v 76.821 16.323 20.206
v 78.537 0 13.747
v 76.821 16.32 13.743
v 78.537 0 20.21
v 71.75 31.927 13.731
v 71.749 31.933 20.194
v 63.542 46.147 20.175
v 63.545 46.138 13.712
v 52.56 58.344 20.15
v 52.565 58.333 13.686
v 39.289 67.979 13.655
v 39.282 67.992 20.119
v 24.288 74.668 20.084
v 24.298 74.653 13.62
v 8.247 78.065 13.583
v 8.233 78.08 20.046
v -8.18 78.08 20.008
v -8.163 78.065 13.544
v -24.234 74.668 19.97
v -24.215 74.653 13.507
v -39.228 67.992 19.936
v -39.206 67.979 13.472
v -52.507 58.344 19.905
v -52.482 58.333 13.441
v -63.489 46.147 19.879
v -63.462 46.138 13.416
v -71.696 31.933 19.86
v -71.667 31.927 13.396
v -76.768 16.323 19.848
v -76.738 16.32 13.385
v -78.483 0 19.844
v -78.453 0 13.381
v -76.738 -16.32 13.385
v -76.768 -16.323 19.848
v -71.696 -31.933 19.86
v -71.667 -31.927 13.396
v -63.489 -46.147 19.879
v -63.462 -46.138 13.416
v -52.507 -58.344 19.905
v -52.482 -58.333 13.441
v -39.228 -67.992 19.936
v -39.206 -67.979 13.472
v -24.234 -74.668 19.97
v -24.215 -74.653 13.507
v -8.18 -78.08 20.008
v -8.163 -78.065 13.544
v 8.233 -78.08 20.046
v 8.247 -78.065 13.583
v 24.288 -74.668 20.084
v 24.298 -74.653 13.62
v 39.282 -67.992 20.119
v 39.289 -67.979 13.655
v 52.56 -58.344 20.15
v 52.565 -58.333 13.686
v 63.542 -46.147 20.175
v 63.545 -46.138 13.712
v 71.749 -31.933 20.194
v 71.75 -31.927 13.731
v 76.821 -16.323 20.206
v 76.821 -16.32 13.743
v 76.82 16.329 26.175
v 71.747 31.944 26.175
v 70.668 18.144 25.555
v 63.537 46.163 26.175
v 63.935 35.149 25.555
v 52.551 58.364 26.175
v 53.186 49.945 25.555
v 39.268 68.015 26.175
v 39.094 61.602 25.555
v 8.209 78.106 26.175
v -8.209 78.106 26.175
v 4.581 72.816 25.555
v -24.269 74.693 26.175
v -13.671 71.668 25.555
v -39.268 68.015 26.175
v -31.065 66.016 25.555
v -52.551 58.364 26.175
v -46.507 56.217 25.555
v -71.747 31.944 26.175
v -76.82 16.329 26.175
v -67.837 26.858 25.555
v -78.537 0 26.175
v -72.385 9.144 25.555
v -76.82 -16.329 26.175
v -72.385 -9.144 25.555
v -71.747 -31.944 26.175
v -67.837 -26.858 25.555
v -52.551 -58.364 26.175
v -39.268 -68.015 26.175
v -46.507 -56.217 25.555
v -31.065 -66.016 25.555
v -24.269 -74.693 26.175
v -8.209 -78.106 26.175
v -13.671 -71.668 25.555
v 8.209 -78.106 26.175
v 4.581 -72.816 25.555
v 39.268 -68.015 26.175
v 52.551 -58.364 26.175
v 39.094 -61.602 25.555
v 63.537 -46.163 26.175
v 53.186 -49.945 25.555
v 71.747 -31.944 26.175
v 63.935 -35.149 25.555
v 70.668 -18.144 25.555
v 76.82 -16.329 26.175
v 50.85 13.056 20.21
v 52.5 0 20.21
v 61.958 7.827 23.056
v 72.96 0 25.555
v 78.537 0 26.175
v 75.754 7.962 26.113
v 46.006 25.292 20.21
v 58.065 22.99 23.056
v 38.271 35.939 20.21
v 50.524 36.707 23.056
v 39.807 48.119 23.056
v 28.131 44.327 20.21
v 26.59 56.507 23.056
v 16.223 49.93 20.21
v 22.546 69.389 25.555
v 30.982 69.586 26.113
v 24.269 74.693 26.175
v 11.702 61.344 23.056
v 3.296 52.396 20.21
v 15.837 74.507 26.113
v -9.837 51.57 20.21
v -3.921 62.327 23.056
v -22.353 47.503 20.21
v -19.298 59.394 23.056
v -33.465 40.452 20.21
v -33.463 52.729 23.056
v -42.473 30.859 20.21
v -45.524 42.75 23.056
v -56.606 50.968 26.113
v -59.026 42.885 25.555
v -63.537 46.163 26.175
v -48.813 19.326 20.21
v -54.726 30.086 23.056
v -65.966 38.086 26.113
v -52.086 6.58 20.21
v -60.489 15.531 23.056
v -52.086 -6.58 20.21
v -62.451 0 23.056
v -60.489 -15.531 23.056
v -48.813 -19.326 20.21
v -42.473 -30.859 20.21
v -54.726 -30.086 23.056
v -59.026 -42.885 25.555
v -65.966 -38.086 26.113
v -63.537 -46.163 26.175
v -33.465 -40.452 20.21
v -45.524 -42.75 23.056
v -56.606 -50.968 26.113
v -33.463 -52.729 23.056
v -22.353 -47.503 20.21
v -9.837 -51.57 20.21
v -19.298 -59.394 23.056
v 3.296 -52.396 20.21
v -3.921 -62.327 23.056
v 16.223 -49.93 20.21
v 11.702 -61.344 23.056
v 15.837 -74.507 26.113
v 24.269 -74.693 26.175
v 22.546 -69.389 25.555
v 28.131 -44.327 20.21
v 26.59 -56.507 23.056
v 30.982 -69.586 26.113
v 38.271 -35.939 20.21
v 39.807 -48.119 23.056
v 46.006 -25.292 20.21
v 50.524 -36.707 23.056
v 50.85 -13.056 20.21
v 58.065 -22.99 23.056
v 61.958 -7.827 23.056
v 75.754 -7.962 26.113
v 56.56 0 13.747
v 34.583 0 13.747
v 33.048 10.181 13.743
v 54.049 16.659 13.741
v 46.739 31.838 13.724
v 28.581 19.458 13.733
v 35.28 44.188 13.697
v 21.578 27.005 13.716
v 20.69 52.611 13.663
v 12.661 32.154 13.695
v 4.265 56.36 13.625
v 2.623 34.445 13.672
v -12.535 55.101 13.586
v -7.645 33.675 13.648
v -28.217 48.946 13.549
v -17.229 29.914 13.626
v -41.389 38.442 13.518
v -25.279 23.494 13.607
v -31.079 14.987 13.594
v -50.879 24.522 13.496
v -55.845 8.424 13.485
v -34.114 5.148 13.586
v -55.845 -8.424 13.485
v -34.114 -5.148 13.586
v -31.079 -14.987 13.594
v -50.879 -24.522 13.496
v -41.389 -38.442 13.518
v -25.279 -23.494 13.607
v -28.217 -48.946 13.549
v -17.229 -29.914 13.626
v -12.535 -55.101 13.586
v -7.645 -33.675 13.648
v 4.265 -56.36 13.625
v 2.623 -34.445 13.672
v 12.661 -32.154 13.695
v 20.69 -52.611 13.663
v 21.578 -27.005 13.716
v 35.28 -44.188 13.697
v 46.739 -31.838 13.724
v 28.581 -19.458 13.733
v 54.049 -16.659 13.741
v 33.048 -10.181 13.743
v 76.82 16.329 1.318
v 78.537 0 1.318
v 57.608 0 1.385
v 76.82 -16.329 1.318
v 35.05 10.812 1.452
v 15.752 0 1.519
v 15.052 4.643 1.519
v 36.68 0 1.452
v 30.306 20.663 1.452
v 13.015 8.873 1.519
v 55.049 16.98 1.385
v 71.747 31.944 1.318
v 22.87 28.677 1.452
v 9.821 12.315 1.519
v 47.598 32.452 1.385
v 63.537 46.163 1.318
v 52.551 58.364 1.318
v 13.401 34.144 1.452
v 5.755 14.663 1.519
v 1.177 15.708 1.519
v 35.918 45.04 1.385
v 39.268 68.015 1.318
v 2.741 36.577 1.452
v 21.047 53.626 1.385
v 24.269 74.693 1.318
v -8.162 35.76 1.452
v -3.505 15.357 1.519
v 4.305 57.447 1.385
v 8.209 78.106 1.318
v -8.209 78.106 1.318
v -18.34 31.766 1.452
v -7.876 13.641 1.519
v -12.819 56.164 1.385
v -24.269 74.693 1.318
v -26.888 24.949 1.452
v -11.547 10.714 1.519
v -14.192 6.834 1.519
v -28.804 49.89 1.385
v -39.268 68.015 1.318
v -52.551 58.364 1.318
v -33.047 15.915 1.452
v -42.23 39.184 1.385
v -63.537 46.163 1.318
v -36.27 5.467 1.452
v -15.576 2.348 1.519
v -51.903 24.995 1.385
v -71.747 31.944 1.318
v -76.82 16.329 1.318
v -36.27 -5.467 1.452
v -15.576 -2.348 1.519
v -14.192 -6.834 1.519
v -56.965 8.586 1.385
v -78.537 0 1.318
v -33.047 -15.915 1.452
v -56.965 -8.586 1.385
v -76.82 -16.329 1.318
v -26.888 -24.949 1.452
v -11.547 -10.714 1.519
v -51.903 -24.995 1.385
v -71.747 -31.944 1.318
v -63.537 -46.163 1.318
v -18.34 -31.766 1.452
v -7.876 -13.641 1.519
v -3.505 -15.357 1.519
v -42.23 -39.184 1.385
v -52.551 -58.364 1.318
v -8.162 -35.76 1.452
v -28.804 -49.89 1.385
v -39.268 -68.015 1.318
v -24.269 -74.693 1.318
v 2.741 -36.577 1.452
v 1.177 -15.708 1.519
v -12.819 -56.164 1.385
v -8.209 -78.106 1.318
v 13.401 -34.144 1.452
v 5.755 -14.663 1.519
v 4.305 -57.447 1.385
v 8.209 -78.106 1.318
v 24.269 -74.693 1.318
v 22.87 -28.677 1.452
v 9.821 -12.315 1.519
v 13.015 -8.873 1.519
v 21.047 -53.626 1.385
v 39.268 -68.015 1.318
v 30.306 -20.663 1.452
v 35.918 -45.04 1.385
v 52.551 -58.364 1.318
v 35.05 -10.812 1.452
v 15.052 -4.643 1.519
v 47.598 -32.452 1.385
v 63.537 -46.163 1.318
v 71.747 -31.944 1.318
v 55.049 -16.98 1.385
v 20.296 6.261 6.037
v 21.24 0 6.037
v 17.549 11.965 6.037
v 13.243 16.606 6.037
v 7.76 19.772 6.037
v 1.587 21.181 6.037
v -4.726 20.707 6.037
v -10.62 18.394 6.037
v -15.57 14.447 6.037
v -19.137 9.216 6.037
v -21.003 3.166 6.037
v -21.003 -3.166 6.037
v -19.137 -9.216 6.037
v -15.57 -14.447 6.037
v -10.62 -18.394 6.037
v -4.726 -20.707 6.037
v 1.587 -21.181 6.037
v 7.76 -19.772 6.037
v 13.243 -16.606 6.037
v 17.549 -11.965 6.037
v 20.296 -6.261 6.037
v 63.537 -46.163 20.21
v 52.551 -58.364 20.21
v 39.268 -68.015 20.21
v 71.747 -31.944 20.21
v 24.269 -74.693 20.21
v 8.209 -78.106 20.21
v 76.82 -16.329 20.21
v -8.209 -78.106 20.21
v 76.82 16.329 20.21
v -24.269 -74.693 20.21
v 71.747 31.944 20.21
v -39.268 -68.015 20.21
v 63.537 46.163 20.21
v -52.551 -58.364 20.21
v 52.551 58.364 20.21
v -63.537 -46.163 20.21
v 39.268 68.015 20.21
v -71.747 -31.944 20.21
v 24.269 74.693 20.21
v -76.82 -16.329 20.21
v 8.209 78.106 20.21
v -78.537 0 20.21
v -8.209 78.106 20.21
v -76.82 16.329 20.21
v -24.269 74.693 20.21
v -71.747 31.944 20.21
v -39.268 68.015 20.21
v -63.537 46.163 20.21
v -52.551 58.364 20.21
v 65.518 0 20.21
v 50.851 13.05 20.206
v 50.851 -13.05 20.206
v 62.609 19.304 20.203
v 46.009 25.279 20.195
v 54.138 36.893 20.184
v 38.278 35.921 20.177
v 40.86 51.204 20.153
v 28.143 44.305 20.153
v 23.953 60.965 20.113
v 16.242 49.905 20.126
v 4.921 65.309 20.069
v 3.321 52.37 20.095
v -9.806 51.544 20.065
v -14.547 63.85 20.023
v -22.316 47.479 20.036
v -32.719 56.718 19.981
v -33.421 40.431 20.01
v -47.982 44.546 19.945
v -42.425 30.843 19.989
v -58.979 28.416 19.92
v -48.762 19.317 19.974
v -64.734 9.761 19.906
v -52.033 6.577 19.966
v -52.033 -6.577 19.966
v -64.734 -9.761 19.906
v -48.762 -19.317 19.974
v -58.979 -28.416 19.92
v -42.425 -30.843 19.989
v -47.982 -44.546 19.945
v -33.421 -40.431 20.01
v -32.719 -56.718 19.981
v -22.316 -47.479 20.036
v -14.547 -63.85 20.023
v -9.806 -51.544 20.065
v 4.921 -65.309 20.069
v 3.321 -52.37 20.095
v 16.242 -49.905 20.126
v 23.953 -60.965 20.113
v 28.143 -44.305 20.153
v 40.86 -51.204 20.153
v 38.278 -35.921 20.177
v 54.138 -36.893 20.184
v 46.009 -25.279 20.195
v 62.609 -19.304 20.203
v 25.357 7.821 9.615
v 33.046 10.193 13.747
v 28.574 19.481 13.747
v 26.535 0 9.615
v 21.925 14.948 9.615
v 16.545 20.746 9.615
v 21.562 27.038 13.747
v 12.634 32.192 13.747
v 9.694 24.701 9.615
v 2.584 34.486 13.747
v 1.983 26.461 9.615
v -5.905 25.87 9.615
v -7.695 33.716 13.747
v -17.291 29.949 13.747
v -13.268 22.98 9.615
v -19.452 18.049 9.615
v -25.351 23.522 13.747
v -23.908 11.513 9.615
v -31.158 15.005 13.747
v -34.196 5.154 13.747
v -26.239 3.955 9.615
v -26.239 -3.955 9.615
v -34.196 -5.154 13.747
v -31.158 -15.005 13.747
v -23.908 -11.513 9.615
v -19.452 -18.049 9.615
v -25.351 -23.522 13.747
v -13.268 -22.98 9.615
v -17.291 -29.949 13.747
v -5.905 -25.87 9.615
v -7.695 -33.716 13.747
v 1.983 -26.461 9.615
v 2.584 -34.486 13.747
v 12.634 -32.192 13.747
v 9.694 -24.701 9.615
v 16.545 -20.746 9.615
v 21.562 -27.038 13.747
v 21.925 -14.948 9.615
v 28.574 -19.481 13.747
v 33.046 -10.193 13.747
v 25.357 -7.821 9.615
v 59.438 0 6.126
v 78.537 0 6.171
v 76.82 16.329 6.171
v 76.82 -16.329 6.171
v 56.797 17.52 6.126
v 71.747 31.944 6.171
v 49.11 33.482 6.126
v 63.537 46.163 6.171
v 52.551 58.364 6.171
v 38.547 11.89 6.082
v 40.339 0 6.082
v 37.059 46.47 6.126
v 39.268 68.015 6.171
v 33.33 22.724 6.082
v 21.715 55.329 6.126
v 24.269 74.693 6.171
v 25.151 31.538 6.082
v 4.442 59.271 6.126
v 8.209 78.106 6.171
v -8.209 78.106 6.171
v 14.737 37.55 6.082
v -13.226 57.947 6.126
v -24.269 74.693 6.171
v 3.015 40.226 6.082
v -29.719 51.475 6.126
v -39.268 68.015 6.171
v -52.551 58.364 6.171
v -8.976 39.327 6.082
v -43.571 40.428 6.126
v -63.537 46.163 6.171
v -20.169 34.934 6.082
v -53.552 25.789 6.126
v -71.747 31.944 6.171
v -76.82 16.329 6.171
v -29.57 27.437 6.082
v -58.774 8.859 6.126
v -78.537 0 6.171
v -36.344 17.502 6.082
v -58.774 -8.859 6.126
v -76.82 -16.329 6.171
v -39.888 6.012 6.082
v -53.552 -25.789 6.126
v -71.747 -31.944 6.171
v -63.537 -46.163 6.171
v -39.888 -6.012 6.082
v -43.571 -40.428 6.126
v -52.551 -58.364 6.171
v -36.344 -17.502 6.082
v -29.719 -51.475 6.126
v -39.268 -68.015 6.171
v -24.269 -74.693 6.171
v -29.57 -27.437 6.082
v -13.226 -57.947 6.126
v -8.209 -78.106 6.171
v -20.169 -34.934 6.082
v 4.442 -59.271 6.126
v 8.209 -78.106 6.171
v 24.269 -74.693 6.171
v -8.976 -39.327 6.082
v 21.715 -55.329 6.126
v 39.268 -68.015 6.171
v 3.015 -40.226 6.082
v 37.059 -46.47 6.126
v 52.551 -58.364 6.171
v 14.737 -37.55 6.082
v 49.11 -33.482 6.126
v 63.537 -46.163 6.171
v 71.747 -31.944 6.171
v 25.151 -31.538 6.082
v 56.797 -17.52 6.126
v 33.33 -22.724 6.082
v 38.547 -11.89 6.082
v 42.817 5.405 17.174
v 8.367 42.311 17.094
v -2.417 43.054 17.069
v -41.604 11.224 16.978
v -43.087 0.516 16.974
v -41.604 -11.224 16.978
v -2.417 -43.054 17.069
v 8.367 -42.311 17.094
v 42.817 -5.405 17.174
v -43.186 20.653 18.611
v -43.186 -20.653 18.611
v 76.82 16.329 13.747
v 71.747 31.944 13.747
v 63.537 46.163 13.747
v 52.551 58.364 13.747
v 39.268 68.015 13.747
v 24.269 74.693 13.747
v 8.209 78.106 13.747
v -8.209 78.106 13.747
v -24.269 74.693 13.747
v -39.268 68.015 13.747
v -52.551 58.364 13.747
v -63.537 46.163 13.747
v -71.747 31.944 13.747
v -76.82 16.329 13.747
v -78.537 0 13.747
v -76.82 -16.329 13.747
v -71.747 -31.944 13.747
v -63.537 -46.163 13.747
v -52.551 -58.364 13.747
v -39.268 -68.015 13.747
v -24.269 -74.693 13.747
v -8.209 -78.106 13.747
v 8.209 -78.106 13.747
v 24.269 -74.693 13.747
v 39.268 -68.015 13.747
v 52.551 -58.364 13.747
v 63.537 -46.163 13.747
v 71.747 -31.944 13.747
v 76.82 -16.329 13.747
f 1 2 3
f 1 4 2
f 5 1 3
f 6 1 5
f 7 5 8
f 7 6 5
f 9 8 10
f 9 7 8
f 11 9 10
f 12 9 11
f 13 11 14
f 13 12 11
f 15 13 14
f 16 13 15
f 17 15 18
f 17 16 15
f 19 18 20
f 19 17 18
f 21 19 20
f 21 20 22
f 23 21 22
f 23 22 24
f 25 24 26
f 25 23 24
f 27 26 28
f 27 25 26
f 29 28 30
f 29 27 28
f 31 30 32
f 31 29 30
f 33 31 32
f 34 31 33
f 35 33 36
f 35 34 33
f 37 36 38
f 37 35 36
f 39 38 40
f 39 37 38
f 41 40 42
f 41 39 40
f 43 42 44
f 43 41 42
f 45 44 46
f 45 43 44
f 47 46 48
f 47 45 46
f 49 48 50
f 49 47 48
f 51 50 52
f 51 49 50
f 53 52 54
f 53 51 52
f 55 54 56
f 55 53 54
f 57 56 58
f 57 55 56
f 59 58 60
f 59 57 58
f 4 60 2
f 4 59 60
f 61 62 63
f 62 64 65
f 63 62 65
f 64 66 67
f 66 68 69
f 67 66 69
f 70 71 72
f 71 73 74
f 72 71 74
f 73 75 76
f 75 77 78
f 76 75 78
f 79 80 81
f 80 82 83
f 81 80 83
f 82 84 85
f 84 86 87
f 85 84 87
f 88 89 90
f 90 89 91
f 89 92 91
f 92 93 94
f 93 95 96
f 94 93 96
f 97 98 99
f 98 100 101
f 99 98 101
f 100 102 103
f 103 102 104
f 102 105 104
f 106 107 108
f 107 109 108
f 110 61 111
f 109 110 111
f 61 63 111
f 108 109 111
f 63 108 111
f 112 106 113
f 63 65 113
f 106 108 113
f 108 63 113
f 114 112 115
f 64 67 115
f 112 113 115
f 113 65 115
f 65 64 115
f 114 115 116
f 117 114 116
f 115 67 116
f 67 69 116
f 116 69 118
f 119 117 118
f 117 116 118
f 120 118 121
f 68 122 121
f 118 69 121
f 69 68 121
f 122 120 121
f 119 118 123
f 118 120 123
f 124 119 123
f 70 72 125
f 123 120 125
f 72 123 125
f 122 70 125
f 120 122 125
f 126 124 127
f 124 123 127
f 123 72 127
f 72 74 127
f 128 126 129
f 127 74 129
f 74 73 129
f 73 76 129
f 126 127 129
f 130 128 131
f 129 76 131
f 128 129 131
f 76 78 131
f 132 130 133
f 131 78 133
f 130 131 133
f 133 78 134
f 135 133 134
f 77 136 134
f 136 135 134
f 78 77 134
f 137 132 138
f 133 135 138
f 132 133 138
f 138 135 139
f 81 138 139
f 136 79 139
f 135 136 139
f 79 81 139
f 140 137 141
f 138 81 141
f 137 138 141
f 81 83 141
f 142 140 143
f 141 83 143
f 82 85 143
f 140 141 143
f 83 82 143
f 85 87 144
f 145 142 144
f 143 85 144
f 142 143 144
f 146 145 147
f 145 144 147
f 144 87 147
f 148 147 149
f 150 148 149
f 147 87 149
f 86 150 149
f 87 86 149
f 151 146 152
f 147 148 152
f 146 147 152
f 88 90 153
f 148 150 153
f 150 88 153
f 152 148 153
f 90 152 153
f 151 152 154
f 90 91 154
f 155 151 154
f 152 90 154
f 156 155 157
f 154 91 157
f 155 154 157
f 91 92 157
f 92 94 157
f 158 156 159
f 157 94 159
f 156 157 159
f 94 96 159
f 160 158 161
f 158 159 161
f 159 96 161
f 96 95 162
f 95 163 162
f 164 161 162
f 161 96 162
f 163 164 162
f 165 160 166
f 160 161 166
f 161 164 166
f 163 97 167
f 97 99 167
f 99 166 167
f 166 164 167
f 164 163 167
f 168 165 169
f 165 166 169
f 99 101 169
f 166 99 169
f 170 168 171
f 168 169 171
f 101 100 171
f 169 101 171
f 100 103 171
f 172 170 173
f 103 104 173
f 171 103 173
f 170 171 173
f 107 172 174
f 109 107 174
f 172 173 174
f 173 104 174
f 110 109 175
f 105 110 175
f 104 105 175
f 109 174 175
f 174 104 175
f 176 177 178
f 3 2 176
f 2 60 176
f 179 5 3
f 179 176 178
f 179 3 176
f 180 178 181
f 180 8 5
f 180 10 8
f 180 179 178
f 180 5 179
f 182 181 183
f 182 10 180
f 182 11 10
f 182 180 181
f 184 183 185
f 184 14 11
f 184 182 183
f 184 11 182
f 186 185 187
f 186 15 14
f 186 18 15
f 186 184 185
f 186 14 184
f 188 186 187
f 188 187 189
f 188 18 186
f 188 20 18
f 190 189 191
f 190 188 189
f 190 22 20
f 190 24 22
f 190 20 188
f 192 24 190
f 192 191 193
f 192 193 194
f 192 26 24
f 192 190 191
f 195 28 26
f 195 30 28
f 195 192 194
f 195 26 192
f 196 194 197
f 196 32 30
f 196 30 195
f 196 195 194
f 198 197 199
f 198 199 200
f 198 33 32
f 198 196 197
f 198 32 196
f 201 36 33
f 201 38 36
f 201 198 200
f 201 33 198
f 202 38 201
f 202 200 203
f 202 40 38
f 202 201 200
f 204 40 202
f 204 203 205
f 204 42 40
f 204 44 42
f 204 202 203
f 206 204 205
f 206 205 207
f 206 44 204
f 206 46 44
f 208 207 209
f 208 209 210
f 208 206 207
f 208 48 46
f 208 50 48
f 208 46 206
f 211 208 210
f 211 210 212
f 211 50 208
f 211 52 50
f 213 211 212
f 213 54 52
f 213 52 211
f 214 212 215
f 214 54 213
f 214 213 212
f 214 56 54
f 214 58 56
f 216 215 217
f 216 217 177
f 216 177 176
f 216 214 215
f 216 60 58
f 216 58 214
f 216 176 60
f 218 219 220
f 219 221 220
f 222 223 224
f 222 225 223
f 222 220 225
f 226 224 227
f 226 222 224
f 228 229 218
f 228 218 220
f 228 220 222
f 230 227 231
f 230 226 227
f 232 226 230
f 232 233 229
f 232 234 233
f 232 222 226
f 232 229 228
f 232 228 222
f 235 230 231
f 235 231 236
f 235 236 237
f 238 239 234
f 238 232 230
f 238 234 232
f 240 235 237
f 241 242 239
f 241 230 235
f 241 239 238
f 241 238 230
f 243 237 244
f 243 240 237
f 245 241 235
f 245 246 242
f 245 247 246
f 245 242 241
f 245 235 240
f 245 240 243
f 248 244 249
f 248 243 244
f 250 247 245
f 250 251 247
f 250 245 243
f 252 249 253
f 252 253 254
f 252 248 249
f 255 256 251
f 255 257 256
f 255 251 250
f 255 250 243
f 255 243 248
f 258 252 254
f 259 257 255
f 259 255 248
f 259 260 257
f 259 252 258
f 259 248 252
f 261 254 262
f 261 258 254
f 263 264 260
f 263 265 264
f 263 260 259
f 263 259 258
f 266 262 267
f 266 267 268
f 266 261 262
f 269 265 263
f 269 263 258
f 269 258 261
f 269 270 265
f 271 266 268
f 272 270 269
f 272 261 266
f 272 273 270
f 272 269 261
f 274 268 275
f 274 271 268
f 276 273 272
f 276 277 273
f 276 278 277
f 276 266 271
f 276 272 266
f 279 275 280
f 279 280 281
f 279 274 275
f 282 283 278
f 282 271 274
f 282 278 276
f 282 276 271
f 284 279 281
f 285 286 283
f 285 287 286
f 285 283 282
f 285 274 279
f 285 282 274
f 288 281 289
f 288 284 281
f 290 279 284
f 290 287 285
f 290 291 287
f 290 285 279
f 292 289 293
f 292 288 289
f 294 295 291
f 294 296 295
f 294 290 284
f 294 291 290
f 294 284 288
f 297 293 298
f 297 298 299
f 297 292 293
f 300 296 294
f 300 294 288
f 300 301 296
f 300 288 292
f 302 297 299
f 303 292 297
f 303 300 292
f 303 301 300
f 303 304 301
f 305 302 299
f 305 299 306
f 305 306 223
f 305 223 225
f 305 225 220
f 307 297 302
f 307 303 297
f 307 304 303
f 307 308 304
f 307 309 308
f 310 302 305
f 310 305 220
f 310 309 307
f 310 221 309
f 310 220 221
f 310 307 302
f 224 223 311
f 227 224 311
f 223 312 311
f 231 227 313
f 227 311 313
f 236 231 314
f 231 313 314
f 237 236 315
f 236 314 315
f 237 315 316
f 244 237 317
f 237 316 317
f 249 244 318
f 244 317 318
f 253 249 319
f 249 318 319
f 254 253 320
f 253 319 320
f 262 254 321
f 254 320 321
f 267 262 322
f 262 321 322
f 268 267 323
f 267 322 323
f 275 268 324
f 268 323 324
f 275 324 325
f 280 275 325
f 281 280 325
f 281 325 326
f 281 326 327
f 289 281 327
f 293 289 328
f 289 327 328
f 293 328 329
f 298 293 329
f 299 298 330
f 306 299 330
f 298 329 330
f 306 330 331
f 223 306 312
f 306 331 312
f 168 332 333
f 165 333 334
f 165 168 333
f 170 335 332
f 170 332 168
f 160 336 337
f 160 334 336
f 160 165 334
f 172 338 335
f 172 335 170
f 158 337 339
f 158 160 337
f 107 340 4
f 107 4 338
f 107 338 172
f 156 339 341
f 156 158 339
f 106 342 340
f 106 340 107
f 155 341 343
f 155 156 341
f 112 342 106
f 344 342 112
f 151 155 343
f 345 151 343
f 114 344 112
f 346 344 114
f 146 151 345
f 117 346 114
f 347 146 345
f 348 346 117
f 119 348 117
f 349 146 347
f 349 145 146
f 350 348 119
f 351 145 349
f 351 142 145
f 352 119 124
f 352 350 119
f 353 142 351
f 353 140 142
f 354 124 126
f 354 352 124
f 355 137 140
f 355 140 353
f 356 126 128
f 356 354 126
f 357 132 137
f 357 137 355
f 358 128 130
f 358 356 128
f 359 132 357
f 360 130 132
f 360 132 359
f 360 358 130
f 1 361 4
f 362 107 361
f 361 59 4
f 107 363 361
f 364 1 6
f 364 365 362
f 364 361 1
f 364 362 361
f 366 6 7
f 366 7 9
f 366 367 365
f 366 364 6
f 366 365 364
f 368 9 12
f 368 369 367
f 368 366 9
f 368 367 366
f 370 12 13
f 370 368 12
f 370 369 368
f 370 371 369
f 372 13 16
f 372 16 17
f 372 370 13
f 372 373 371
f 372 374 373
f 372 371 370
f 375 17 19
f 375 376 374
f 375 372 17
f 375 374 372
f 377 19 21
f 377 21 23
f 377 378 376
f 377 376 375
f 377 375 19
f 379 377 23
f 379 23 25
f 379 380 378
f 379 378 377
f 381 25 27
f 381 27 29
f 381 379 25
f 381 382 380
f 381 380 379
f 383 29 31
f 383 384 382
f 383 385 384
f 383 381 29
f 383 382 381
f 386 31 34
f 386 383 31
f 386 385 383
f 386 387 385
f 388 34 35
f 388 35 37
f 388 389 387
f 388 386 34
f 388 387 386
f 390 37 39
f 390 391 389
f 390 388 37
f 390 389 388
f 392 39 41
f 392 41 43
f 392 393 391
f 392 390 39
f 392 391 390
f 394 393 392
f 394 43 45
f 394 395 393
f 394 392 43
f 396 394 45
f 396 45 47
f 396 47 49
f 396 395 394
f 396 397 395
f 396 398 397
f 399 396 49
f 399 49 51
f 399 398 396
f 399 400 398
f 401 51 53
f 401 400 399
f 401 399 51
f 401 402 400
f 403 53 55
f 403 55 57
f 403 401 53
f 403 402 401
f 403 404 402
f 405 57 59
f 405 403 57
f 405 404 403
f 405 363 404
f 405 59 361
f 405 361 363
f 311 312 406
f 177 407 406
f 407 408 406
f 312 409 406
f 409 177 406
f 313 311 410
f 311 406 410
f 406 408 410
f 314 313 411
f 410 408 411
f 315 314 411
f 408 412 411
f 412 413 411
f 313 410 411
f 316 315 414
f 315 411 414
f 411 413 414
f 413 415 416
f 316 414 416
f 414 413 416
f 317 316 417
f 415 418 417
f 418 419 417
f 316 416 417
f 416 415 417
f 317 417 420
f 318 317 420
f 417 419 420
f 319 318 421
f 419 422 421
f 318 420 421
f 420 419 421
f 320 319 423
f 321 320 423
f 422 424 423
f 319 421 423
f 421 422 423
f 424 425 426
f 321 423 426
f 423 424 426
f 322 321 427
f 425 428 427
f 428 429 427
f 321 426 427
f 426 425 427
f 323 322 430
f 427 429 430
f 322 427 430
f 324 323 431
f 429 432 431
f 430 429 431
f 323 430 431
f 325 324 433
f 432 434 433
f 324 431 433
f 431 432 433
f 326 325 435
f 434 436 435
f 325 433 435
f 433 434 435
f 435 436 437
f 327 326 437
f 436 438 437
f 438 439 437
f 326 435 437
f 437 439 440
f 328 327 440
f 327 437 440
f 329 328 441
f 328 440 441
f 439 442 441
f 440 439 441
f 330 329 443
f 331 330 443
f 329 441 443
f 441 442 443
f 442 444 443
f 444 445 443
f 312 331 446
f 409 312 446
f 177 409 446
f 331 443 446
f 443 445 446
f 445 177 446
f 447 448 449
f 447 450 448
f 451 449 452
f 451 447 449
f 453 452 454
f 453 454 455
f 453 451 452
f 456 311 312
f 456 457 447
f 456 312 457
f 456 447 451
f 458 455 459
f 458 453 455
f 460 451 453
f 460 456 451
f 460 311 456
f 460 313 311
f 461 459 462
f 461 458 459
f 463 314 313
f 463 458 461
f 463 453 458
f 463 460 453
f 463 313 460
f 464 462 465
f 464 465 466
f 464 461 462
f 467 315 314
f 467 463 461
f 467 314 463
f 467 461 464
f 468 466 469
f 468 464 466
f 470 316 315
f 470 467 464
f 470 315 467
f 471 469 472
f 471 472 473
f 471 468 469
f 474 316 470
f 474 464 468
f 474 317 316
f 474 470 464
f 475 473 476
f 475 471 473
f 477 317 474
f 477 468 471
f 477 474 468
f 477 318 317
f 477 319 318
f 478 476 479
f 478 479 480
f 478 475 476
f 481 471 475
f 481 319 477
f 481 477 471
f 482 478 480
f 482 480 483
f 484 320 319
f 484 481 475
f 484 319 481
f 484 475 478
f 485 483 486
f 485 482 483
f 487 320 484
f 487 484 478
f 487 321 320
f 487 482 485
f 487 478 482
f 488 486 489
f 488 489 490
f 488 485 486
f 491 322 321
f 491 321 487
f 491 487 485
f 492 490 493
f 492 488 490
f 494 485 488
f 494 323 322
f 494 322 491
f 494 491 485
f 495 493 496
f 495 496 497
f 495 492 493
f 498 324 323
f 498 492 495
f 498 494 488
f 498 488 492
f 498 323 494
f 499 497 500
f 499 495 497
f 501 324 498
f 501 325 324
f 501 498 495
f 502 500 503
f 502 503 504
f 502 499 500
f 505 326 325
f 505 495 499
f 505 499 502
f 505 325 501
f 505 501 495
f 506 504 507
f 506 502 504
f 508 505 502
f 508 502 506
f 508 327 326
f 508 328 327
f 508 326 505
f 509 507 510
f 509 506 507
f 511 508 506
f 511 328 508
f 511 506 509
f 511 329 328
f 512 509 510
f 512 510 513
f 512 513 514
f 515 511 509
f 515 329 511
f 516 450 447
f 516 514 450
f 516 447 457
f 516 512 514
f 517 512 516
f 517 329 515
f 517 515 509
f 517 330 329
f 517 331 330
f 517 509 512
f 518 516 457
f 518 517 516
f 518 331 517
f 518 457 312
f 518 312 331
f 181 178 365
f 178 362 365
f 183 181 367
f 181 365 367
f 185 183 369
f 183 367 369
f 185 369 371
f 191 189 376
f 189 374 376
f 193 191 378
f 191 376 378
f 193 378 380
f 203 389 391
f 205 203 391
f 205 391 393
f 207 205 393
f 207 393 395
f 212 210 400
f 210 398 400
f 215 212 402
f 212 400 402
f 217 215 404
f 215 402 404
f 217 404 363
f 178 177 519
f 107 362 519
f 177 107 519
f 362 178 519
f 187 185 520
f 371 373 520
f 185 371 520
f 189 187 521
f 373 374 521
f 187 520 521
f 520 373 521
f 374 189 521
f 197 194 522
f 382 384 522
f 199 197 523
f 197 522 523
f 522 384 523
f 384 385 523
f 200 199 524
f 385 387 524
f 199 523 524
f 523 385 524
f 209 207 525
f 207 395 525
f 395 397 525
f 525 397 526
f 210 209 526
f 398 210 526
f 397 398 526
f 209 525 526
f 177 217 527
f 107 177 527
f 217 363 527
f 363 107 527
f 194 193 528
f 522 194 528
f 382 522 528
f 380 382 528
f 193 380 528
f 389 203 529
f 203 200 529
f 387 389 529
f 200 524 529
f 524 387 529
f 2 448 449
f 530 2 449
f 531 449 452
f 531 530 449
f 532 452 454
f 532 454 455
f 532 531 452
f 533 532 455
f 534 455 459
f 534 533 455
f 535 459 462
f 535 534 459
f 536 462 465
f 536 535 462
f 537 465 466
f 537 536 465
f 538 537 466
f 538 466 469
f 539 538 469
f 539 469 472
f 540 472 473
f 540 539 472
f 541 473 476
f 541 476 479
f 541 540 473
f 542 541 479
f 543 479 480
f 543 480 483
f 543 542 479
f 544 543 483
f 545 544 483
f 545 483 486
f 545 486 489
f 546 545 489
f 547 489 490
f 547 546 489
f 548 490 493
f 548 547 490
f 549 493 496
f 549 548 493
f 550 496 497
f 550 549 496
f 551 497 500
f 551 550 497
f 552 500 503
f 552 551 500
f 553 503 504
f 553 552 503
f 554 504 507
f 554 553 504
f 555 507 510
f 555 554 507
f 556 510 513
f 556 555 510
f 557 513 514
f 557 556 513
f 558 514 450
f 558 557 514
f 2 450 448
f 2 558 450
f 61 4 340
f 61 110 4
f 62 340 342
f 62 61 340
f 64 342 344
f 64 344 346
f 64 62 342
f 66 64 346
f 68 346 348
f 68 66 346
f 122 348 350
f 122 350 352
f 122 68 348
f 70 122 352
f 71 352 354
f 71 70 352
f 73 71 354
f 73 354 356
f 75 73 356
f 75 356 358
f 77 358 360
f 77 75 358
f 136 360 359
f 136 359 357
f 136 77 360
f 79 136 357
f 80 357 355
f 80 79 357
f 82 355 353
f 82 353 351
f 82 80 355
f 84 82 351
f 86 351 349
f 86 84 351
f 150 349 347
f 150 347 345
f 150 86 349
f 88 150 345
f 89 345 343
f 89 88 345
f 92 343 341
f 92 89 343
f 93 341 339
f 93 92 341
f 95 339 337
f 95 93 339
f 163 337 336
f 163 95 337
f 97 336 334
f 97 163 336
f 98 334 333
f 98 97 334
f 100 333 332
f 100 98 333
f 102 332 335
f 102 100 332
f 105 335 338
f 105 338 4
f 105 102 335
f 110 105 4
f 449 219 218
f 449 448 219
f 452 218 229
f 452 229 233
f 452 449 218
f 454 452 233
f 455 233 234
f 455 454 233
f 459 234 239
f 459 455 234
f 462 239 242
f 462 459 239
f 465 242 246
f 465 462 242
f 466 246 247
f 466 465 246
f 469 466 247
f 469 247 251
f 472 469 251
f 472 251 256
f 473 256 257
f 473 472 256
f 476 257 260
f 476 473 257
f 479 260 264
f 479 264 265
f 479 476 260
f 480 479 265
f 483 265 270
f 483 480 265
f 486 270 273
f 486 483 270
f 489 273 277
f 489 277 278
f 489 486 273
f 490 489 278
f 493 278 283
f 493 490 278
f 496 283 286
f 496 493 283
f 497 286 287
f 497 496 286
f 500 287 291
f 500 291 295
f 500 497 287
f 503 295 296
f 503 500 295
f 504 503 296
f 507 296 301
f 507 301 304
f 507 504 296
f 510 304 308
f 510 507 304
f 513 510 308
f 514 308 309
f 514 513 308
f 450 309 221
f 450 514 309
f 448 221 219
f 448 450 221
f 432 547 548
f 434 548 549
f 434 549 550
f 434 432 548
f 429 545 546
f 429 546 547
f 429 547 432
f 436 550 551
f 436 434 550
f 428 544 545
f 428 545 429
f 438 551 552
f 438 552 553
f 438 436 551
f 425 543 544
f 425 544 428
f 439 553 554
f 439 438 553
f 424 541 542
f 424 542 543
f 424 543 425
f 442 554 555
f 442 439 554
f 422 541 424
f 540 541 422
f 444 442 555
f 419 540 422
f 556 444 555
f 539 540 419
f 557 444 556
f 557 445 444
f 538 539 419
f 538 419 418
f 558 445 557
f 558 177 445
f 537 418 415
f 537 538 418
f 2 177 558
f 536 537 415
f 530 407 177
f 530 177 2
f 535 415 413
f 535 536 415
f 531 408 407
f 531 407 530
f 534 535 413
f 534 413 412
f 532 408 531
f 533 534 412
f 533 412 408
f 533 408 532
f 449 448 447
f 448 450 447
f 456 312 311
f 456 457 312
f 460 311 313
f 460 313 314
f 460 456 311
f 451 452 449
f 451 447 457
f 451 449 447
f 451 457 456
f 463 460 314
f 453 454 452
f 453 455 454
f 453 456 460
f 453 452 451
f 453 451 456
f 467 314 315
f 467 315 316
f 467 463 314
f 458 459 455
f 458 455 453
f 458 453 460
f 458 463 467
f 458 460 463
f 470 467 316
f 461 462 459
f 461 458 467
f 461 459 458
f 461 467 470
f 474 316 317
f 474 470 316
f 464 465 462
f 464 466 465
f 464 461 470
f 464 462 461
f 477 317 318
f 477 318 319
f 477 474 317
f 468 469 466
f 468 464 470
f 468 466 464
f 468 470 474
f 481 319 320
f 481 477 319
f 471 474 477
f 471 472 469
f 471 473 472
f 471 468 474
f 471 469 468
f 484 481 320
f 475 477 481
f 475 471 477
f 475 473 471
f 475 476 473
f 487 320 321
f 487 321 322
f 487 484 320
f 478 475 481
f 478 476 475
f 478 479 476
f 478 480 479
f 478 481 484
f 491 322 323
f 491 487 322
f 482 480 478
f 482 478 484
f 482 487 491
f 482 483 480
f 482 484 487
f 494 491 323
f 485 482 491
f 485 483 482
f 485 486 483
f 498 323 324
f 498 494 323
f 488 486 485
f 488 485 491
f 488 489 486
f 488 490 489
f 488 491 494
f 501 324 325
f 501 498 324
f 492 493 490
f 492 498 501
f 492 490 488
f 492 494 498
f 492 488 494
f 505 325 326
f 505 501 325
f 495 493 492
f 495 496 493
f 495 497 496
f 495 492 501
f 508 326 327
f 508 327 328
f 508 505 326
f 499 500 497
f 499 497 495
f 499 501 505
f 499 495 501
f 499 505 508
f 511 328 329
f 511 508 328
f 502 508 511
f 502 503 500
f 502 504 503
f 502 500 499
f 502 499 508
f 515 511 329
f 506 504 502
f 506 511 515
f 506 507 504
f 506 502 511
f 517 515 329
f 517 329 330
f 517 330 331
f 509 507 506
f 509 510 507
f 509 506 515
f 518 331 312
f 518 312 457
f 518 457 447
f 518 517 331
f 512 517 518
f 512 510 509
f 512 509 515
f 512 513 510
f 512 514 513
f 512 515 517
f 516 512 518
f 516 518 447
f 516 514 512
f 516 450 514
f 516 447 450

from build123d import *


with BuildPart() as f1:
    # F0 (on Front) → F1 (revolve)
    with BuildSketch(Plane.XZ):
        with BuildLine():
            add(Edge.make_bspline(
                [(15.7515468455, 1.5186385906), (16.2569814963, 1.959361021), (17.2846288696, 2.8554358099), (18.9526439694, 4.166854506), (20.3713483355, 5.3705503671), (21.0733665388, 5.9114203979), (21.2399935025, 6.0371666258)],
                knots=[0, 0, 0, 0, 0.0363510009, 0.0739086854, 0.112559803, 0.1251067413, 0.1251067413, 0.1251067413, 0.1251067413], degree=3))
            Line((15.7515468455, 1.5186385906), (78.5365324529, 1.318038129))
            Line((78.5365324529, 1.318038129), (78.5365324529, 6.1707655311))
            Line((78.5365324529, 6.1707655311), (21.2399935025, 6.0371666258))
        make_face()
    revolve(axis=Axis((0, 0, 16.4799756994), (0, 0, 1)))


with BuildPart() as f2:
    # F0 (on Front) → F2 (revolve)
    with BuildSketch(Plane.XZ):
        with BuildLine():
            add(Edge.make_bspline(
                [(21.2399935025, 6.0371666258), (21.5009112116, 6.234070038), (22.1342698046, 6.6949997973), (23.1310298936, 7.396516823), (24.8194929191, 8.4575455522), (25.7576037559, 9.2164833794), (29.1454642161, 11.0654940256), (31.8957072977, 12.37057363), (33.6465721386, 13.3169859548), (34.5826536048, 13.7466102251)],
                knots=[0.1251067413, 0.1251067413, 0.1251067413, 0.1251067413, 0.1447537319, 0.1753550601, 0.2105716651, 0.239375986, 0.2887628656, 0.3347946409, 0.3782386594, 0.3782386594, 0.3782386594, 0.3782386594], degree=3))
            Line((21.2399935025, 6.0371666258), (78.5365324529, 6.1707655311))
            Line((78.5365324529, 6.1707655311), (78.5365324529, 13.7466102251))
            Line((78.5365324529, 13.7466102251), (34.5826536048, 13.7466102251))
        make_face()
    revolve(axis=Axis((0, 0, 16.4799756994), (0, 0, 1)))


with BuildPart() as f3:
    # F0 (on Front) → F3 (revolve)
    with BuildSketch(Plane.XZ):
        with BuildLine():
            add(Edge.make_bspline(
                [(34.5826536048, 13.7466102251), (34.606915689, 13.7577455596), (35.6814873865, 14.2488728005), (38.048823558, 15.143884105), (41.4594226373, 16.4985573287), (45.4508659579, 18.1028686828), (49.3448973071, 19.2429844364), (51.5891441877, 19.9139420623), (52.4998004667, 20.2101180306)],
                knots=[0.3782386594, 0.3782386594, 0.3782386594, 0.3782386594, 0.3793646751, 0.4279916519, 0.4771807945, 0.5302968437, 0.5840070306, 0.6225372943, 0.6225372943, 0.6225372943, 0.6225372943], degree=3))
            Line((34.5826536048, 13.7466102251), (78.5365324529, 13.7466102251))
            Line((78.5365324529, 13.7466102251), (78.5365324529, 20.2101180306))
            Line((78.5365324529, 20.2101180306), (52.4998004667, 20.2101180306))
        make_face()
    revolve(axis=Axis((0.0349167788, 0, 16.4799756994), (-0.0023317035, 0, 0.9999972816)))


with BuildPart() as f4:
    # F0 (on Front) → F4 (revolve)
    with BuildSketch(Plane.XZ):
        with BuildLine():
            add(Edge.make_bspline(
                [(52.4998004667, 20.2101180306), (52.7666258691, 20.2968986017), (54.1648589641, 20.7628246645), (56.603471745, 21.7101812772), (60.2482012651, 22.3407375348), (62.771290046, 23.2311631143), (66.3751725962, 23.8129712703), (70.133277328, 24.8132282159), (73.3957067914, 25.7248775779), (76.803780903, 26.2492134197), (78.0301706551, 26.1968164211), (78.5365324529, 26.1751823212)],
                knots=[0.6225372943, 0.6225372943, 0.6225372943, 0.6225372943, 0.6338267932, 0.6822117186, 0.7308995857, 0.7727704857, 0.8213286443, 0.8719649813, 0.9198306396, 0.966899021, 1, 1, 1, 1], degree=3))
            Line((52.4998004667, 20.2101180306), (78.5365324529, 20.2101180306))
            Line((78.5365324529, 20.2101180306), (78.5365324529, 26.1751823212))
        make_face()
    revolve(axis=Axis((0, 0, 16.4799756994), (0, 0, 1)))


solid = Compound([f1.part, f2.part, f3.part, f4.part])
